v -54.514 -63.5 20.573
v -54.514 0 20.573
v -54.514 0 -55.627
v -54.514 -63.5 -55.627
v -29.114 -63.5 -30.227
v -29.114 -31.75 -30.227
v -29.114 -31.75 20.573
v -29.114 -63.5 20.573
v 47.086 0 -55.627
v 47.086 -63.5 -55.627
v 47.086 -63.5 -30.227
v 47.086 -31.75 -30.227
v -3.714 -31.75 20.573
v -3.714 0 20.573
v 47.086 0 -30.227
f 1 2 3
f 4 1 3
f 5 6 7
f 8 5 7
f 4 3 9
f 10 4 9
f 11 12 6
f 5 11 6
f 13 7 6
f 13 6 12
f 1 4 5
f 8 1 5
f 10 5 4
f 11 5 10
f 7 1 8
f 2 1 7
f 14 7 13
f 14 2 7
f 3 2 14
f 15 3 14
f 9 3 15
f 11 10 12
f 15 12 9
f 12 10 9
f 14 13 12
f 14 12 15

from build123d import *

# Parameters (mm, degrees)
F1_DEPTH = 63.5
F2_W     = 76.2
F2_H     = 31.75
F3_DEPTH = 50.8
F4_SIZE  = 50.8


with BuildPart() as f1:
    # F0 (on Front) → F1 (new body)
    with BuildSketch(Plane.XZ):
        Polygon((-29.114198, 20.572871), (-54.514198, 20.572871), (-54.514198, -55.627129), (47.085802, -55.627129), (47.085802, -30.227129), (-29.114198, -30.227129), align=None)
    extrude(amount=F1_DEPTH)

    # F2 (on face) → F3 (join)
    with BuildSketch(Plane.XY.offset(-30.227129)):
        with Locations((8.985802, -15.875)):
            Rectangle(F2_W, F2_H)
    extrude(amount=F3_DEPTH)

    # F4
    f4_edges = [f1.edges().sort_by_distance(p)[0] for p in [
        (47.085802, -15.875, 20.572871),
    ]]
    chamfer(f4_edges, length=F4_SIZE)


solid = f1.part
